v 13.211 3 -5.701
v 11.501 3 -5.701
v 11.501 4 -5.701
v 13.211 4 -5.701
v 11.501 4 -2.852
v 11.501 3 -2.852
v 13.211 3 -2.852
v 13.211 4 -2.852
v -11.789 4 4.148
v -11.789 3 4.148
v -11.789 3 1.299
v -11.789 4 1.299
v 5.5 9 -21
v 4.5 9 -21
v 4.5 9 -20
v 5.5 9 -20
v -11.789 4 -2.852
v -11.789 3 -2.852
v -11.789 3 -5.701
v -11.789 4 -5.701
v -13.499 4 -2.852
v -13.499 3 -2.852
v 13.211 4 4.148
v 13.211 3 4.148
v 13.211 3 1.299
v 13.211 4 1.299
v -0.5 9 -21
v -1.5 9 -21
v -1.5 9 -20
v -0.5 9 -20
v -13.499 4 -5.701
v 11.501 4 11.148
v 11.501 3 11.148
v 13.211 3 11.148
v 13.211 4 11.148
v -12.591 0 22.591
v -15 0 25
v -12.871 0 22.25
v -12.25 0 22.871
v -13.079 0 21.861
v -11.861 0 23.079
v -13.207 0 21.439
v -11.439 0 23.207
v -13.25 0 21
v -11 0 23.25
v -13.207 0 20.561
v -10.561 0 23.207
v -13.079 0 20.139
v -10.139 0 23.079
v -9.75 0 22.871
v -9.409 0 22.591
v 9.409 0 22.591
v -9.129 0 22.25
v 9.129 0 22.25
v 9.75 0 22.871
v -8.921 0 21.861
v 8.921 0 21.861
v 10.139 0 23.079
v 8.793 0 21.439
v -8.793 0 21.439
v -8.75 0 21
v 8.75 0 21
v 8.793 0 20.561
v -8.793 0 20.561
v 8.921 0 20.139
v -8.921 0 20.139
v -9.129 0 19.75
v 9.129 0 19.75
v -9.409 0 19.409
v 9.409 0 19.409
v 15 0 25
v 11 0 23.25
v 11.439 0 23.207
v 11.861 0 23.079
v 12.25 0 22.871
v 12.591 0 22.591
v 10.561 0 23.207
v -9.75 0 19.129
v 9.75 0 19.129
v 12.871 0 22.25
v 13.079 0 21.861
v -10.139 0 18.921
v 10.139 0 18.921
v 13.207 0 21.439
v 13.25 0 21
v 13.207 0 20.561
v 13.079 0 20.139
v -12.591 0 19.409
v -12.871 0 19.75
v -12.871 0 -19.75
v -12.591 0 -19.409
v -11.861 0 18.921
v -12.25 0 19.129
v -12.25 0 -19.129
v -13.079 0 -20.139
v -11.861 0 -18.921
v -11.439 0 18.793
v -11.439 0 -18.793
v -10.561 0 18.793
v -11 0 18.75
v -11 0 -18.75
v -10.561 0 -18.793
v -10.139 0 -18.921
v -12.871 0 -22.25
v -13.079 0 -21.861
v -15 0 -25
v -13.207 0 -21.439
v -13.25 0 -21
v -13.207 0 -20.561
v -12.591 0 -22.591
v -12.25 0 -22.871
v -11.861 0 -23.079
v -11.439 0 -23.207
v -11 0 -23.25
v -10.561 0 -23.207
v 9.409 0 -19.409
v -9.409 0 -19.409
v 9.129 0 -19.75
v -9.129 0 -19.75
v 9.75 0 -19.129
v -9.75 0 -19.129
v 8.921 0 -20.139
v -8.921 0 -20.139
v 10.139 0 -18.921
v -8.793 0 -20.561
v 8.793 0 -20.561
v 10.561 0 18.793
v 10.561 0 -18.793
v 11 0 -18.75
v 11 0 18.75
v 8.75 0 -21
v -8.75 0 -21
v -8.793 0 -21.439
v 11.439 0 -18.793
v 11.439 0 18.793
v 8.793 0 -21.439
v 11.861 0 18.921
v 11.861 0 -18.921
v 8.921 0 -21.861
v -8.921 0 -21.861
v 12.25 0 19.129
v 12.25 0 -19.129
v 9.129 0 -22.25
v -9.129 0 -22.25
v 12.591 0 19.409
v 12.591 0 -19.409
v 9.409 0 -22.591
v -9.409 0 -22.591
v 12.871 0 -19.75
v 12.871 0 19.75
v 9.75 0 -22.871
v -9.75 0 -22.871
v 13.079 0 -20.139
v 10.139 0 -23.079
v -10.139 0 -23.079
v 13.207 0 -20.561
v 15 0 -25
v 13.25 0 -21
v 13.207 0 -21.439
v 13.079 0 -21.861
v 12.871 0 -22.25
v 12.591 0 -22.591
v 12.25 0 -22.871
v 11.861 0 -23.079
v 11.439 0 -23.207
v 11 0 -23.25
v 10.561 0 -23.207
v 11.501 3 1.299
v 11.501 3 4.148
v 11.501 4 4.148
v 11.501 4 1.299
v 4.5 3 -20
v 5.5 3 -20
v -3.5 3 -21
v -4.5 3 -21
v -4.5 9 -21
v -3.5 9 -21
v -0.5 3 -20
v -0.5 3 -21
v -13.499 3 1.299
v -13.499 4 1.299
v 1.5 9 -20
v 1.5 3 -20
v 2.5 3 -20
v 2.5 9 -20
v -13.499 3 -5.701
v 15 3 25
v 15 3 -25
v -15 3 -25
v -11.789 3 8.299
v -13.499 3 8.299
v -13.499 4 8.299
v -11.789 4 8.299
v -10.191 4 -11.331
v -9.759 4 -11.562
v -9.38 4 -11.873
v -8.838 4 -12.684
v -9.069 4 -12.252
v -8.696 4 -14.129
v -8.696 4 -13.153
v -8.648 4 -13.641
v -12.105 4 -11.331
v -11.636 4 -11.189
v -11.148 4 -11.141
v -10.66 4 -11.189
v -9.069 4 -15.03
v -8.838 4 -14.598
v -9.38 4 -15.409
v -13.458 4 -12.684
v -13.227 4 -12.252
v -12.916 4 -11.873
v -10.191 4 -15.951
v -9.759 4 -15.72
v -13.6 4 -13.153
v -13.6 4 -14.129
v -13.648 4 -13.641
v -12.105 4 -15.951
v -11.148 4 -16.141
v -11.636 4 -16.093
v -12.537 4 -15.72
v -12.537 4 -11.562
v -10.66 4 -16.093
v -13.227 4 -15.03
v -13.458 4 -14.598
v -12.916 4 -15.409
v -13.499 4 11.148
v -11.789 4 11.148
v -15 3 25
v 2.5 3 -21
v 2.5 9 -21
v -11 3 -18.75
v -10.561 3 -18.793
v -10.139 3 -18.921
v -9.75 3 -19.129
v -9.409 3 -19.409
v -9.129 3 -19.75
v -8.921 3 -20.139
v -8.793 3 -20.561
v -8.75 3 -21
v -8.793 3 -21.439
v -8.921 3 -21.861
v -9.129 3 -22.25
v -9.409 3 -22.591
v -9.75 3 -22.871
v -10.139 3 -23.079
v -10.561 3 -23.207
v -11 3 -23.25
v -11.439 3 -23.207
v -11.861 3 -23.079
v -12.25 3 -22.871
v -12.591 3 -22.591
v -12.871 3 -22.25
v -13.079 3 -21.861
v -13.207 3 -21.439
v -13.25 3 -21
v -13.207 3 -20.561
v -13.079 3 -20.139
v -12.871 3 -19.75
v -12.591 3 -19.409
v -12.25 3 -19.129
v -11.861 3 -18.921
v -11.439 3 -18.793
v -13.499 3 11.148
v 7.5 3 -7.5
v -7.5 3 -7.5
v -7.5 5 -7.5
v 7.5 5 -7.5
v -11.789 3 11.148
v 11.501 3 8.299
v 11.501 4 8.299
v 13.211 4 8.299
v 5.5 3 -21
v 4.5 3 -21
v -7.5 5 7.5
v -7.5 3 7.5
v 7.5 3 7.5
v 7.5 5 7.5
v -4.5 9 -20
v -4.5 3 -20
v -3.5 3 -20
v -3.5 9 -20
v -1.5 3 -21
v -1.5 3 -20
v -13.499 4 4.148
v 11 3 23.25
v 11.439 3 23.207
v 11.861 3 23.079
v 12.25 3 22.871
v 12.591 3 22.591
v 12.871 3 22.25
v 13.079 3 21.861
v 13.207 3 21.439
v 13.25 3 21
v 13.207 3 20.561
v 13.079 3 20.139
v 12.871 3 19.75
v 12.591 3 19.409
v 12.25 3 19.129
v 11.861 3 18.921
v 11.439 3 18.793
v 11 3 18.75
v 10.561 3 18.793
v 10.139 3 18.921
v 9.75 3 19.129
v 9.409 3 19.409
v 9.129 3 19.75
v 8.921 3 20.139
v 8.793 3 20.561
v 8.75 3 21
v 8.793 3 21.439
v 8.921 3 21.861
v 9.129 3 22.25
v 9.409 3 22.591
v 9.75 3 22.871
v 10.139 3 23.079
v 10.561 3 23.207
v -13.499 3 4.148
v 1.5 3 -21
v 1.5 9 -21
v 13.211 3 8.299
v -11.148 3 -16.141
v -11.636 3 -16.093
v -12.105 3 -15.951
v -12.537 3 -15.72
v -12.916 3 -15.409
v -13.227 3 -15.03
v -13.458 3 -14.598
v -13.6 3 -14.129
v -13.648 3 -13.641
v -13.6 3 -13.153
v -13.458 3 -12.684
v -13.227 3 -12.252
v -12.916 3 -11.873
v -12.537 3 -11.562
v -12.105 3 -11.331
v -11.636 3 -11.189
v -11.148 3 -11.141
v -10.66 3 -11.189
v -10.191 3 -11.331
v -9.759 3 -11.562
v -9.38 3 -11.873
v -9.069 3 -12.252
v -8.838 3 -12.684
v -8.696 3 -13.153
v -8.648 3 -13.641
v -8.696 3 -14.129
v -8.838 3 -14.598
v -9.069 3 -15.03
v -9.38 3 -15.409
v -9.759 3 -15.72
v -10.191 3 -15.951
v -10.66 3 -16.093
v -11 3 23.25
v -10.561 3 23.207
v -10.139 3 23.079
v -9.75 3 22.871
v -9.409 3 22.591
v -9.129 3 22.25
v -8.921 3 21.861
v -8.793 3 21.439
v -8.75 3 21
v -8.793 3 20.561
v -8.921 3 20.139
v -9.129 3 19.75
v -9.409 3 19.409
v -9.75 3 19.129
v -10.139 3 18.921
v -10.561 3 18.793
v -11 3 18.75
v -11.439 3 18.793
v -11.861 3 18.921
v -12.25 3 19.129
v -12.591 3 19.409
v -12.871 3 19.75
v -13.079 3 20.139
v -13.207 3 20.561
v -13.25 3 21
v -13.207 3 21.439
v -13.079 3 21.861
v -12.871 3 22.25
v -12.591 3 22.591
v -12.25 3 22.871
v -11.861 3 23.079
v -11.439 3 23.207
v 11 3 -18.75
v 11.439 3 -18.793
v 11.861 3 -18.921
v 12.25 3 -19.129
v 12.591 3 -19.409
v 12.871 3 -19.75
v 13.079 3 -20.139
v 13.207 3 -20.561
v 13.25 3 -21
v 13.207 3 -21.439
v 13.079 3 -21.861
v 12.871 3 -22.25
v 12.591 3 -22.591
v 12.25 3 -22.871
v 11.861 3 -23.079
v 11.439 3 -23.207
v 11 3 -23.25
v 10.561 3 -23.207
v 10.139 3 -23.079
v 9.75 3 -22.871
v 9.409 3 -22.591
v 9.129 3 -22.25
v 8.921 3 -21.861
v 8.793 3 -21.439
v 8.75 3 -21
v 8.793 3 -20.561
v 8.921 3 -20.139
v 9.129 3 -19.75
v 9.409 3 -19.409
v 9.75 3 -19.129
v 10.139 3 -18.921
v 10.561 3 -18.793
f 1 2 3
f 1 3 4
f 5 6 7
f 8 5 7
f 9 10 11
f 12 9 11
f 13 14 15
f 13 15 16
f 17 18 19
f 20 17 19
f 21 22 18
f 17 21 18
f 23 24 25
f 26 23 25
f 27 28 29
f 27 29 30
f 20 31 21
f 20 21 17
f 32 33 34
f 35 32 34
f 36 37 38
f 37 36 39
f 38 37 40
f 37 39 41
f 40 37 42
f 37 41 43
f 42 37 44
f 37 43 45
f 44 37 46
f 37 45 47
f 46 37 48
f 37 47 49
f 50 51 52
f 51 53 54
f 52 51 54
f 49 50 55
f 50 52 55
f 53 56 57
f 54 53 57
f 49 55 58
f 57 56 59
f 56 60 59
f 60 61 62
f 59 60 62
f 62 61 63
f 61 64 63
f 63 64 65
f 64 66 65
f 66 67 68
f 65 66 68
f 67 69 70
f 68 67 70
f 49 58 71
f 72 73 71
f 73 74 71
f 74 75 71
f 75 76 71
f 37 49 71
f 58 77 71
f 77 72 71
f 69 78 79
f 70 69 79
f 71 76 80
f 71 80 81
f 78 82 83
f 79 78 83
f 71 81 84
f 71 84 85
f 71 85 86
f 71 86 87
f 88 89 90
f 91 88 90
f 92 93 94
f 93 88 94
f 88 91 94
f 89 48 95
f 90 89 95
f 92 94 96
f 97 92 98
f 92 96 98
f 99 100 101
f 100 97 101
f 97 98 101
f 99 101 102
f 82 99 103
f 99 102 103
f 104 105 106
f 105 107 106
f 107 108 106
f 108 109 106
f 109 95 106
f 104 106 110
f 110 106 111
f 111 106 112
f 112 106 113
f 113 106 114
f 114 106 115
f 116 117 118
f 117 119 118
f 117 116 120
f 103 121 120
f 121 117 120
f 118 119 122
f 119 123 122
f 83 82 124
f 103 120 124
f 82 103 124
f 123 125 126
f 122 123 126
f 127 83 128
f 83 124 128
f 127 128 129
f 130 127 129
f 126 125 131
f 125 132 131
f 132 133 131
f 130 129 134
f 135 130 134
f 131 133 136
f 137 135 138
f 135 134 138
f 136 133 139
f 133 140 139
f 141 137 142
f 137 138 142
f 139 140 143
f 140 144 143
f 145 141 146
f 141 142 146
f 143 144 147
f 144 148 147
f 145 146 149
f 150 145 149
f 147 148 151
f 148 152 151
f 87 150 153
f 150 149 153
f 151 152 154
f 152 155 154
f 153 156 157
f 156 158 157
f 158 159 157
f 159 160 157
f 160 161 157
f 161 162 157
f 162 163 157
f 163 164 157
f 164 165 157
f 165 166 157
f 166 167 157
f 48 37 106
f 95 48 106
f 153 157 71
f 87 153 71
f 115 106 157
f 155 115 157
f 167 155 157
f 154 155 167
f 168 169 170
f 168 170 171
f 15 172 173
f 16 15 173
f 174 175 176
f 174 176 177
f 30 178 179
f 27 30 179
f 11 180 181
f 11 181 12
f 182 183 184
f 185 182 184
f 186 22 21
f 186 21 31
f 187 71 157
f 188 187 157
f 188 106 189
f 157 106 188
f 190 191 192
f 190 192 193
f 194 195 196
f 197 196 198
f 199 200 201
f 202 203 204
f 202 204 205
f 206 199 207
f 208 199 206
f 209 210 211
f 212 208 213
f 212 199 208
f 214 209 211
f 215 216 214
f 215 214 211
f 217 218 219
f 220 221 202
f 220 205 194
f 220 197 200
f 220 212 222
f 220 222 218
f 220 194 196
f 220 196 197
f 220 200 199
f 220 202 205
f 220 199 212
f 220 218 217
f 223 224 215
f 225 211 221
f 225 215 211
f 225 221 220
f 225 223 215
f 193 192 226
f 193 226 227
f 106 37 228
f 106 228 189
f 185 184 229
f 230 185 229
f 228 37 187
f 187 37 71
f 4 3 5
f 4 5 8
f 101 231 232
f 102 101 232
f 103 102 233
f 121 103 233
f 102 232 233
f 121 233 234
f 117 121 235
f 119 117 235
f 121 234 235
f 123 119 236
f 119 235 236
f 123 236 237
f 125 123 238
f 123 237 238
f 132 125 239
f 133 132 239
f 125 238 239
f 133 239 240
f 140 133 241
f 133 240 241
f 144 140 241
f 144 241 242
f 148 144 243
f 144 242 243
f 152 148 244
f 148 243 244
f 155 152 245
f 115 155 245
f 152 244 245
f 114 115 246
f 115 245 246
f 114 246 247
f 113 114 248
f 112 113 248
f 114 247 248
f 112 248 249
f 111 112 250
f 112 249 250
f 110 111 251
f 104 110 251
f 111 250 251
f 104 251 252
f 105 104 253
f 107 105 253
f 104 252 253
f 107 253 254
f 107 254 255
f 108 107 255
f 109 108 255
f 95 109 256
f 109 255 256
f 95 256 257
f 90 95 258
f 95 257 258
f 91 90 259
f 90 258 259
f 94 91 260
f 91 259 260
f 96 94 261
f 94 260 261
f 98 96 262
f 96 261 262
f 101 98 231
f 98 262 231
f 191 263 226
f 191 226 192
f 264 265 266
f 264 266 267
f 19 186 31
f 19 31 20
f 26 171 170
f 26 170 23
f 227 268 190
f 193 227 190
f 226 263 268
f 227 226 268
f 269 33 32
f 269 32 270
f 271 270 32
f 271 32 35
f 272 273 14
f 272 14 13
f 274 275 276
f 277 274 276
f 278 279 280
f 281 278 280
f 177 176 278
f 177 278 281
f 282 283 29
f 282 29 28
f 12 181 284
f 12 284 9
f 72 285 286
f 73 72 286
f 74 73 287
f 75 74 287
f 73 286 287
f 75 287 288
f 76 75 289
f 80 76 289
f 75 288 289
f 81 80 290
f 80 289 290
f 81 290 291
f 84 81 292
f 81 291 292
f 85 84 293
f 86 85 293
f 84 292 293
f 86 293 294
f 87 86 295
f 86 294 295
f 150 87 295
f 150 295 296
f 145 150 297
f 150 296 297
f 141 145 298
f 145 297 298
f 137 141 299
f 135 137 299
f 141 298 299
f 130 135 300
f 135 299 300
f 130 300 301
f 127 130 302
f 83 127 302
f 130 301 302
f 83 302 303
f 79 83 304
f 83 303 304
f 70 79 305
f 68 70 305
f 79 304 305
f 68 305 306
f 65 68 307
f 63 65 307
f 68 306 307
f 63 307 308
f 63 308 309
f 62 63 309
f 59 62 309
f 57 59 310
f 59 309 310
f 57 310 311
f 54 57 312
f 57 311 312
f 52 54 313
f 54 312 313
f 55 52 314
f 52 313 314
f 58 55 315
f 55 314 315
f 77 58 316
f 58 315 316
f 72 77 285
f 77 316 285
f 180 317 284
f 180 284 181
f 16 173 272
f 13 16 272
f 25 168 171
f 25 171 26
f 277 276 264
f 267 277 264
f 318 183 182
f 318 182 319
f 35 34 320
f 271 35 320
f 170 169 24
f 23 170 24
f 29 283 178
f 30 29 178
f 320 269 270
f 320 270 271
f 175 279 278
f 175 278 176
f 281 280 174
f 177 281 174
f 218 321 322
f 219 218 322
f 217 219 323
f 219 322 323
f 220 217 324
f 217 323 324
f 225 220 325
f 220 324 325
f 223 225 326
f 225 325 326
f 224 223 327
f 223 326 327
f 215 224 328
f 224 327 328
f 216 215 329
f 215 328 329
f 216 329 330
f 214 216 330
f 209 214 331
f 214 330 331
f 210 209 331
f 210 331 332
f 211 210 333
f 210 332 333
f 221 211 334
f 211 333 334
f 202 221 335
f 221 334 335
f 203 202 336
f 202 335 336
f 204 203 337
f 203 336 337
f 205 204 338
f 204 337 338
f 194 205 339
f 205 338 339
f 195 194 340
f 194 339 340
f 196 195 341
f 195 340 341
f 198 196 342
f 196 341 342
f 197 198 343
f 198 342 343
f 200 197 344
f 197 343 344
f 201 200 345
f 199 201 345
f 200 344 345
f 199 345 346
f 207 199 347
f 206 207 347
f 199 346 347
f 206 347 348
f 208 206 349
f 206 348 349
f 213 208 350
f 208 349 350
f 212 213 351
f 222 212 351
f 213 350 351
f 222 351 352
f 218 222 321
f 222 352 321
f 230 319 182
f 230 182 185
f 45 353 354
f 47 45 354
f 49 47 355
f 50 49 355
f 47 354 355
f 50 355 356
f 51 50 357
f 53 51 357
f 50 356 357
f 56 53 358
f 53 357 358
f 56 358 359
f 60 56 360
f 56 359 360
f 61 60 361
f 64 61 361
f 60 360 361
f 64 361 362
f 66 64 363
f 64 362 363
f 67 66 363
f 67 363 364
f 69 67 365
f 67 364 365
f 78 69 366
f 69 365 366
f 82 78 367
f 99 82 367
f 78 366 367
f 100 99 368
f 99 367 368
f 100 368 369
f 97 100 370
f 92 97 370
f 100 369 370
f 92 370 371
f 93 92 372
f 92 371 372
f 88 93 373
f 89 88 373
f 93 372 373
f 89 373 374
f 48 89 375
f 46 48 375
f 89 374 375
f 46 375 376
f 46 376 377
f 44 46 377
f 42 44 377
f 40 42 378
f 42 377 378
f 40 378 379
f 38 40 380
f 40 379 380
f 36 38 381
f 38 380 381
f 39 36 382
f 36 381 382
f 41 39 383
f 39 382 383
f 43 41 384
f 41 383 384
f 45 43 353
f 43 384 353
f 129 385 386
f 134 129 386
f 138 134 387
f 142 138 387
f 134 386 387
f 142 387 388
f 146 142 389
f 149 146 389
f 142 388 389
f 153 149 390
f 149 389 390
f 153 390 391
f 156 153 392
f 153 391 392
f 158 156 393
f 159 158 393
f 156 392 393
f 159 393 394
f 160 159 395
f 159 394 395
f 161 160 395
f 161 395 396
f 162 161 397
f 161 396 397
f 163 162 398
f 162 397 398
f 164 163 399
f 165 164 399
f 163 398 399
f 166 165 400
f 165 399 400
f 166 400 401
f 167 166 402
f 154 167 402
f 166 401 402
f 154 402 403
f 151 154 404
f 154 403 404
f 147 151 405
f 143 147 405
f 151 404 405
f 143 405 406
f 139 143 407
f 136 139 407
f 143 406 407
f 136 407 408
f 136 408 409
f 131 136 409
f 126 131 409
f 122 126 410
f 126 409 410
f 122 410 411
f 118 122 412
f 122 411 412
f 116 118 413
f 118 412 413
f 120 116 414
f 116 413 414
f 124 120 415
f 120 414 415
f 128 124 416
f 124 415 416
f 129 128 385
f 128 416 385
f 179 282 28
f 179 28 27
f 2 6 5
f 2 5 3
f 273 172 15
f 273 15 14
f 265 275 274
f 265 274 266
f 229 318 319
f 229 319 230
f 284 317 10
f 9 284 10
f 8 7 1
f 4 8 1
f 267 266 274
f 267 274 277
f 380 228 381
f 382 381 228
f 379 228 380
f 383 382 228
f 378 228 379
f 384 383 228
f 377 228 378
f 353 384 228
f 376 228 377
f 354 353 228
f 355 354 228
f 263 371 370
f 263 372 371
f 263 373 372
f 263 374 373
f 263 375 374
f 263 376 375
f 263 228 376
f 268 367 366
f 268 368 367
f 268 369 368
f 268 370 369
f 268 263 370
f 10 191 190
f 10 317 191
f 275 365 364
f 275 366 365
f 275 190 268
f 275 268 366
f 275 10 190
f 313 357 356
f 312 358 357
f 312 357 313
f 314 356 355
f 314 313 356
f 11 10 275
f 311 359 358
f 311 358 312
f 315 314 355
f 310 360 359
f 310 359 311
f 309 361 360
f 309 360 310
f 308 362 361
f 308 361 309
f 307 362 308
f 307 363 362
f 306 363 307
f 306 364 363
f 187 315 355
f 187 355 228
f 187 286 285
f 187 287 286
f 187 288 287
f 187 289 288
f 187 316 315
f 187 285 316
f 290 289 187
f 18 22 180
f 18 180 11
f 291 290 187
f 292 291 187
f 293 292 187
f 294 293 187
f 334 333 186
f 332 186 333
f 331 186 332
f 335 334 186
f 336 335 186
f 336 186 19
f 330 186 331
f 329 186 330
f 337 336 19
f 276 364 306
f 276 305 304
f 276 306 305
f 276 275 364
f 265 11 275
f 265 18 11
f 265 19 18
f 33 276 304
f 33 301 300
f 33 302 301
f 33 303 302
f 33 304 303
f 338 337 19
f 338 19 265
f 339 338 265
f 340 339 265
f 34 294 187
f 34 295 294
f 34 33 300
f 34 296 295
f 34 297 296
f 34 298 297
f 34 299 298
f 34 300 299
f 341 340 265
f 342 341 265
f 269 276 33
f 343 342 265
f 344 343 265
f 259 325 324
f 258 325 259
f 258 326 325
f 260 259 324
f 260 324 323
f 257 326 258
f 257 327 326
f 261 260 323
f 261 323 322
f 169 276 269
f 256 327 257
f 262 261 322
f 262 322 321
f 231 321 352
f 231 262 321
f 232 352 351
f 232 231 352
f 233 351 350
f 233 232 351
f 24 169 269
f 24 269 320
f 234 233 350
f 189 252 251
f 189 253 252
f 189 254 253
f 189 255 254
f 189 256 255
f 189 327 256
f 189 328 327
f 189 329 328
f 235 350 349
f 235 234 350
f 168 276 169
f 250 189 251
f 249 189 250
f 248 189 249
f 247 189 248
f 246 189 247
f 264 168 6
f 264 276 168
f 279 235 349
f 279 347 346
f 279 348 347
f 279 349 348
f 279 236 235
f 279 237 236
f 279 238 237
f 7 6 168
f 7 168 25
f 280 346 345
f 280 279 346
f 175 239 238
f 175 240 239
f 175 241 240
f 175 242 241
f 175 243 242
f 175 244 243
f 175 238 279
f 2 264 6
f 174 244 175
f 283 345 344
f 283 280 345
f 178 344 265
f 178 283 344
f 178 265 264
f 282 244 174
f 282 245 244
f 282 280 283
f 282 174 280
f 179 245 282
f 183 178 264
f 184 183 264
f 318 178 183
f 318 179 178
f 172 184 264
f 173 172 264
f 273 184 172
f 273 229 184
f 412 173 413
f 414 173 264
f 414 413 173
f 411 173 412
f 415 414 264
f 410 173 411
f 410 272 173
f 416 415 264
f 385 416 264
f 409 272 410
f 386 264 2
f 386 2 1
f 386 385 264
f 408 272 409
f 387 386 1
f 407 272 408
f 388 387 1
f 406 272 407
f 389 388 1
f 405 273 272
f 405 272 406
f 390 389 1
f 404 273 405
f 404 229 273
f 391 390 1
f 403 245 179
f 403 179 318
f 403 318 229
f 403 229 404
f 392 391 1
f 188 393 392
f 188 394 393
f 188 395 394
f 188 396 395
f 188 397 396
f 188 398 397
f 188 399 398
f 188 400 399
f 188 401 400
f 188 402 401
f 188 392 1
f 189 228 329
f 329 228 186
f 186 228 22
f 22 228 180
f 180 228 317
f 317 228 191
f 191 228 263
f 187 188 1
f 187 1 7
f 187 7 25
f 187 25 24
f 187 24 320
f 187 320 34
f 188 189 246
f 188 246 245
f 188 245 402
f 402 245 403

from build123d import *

# Parameters (mm, degrees)
SKETCH1_W            = 30
SKETCH1_H            = 50
BOSS_EXTRUDE1_DEPTH  = 3
SKETCH2_R            = 2.25
CUT_EXTRUDE1_DEPTH   = 3
LPATTERN1_COUNT      = 2
LPATTERN1_PITCH      = 22
LPATTERN1_COUNT_DIR2 = 2
LPATTERN1_PITCH_DIR2 = 42
SKETCH3_W            = 1
SKETCH3_H            = 1
BOSS_EXTRUDE2_DEPTH  = 6
LPATTERN2_COUNT      = 4
LPATTERN2_PITCH      = 3
SKETCH4_W            = 15
SKETCH4_H            = 15
BOSS_EXTRUDE3_DEPTH  = 2
SKETCH5_W            = 1.709574014
SKETCH5_H            = 2.849290021
BOSS_EXTRUDE4_DEPTH  = 1
LPATTERN3_COUNT      = 3
LPATTERN3_PITCH      = 7
LPATTERN3_COUNT_DIR2 = 2
LPATTERN3_PITCH_DIR2 = 25
SKETCH6_R            = 2.5
BOSS_EXTRUDE5_DEPTH  = 1


with BuildPart() as part:
    # Sketch1 → Boss-Extrude1 (new body)
    with BuildSketch(Plane(origin=(0, 0, 0), x_dir=(1, 0, 0), z_dir=(0, 1, 0))):
        Rectangle(SKETCH1_W, SKETCH1_H)
    extrude(amount=BOSS_EXTRUDE1_DEPTH)

    # Sketch2 → Cut-Extrude1 (cut)
    with BuildSketch(Plane(origin=(0, 3, 0), x_dir=(1, 0, 0), z_dir=(0, 1, 0))):
        with Locations(Location((-11, 21, 0), (0, 0, 270))):
            Circle(SKETCH2_R)
    cut_extrude1 = extrude(amount=-CUT_EXTRUDE1_DEPTH, mode=Mode.SUBTRACT)

    # LPattern1: Cut-Extrude1 2 × 2
    with Locations(*[(i * LPATTERN1_PITCH, 0, j * LPATTERN1_PITCH_DIR2) for i in range(LPATTERN1_COUNT) for j in range(LPATTERN1_COUNT_DIR2) if (i, j) != (0, 0)]):
        add(cut_extrude1, mode=Mode.SUBTRACT)

    # Sketch3 → Boss-Extrude2 (add)
    with BuildSketch(Plane(origin=(0, 3, 0), x_dir=(1, 0, 0), z_dir=(0, 1, 0))):
        with Locations((-4, 20.5)):
            Rectangle(SKETCH3_W, SKETCH3_H)
    boss_extrude2 = extrude(amount=BOSS_EXTRUDE2_DEPTH)

    # LPattern2: Boss-Extrude2 ×4
    with Locations(*[(i * LPATTERN2_PITCH, 0, 0) for i in range(1, LPATTERN2_COUNT)]):
        add(boss_extrude2)

    # Sketch4 → Boss-Extrude3 (add)
    with BuildSketch(Plane(origin=(0, 3, 0), x_dir=(1, 0, 0), z_dir=(0, 1, 0))):
        Rectangle(SKETCH4_W, SKETCH4_H)
    extrude(amount=BOSS_EXTRUDE3_DEPTH)

    # Sketch5 → Boss-Extrude4 (add)
    with BuildSketch(Plane(origin=(0, 3, 0), x_dir=(1, 0, 0), z_dir=(0, 1, 0))):
        with Locations((-12.643724472, -9.7232022)):
            Rectangle(SKETCH5_W, SKETCH5_H)
    boss_extrude4 = extrude(amount=BOSS_EXTRUDE4_DEPTH)

    # LPattern3: Boss-Extrude4 3 × 2
    with Locations(*[(j * LPATTERN3_PITCH_DIR2, 0, -i * LPATTERN3_PITCH) for i in range(LPATTERN3_COUNT) for j in range(LPATTERN3_COUNT_DIR2) if (i, j) != (0, 0)]):
        add(boss_extrude4)

    # Sketch6 → Boss-Extrude5 (add)
    with BuildSketch(Plane(origin=(0, 3, 0), x_dir=(1, 0, 0), z_dir=(0, 1, 0))):
        with Locations(Location((-11.14784721, 13.64097598, 0), (0, 0, 90))):
            Circle(SKETCH6_R)
    extrude(amount=BOSS_EXTRUDE5_DEPTH)


solid = part.part
